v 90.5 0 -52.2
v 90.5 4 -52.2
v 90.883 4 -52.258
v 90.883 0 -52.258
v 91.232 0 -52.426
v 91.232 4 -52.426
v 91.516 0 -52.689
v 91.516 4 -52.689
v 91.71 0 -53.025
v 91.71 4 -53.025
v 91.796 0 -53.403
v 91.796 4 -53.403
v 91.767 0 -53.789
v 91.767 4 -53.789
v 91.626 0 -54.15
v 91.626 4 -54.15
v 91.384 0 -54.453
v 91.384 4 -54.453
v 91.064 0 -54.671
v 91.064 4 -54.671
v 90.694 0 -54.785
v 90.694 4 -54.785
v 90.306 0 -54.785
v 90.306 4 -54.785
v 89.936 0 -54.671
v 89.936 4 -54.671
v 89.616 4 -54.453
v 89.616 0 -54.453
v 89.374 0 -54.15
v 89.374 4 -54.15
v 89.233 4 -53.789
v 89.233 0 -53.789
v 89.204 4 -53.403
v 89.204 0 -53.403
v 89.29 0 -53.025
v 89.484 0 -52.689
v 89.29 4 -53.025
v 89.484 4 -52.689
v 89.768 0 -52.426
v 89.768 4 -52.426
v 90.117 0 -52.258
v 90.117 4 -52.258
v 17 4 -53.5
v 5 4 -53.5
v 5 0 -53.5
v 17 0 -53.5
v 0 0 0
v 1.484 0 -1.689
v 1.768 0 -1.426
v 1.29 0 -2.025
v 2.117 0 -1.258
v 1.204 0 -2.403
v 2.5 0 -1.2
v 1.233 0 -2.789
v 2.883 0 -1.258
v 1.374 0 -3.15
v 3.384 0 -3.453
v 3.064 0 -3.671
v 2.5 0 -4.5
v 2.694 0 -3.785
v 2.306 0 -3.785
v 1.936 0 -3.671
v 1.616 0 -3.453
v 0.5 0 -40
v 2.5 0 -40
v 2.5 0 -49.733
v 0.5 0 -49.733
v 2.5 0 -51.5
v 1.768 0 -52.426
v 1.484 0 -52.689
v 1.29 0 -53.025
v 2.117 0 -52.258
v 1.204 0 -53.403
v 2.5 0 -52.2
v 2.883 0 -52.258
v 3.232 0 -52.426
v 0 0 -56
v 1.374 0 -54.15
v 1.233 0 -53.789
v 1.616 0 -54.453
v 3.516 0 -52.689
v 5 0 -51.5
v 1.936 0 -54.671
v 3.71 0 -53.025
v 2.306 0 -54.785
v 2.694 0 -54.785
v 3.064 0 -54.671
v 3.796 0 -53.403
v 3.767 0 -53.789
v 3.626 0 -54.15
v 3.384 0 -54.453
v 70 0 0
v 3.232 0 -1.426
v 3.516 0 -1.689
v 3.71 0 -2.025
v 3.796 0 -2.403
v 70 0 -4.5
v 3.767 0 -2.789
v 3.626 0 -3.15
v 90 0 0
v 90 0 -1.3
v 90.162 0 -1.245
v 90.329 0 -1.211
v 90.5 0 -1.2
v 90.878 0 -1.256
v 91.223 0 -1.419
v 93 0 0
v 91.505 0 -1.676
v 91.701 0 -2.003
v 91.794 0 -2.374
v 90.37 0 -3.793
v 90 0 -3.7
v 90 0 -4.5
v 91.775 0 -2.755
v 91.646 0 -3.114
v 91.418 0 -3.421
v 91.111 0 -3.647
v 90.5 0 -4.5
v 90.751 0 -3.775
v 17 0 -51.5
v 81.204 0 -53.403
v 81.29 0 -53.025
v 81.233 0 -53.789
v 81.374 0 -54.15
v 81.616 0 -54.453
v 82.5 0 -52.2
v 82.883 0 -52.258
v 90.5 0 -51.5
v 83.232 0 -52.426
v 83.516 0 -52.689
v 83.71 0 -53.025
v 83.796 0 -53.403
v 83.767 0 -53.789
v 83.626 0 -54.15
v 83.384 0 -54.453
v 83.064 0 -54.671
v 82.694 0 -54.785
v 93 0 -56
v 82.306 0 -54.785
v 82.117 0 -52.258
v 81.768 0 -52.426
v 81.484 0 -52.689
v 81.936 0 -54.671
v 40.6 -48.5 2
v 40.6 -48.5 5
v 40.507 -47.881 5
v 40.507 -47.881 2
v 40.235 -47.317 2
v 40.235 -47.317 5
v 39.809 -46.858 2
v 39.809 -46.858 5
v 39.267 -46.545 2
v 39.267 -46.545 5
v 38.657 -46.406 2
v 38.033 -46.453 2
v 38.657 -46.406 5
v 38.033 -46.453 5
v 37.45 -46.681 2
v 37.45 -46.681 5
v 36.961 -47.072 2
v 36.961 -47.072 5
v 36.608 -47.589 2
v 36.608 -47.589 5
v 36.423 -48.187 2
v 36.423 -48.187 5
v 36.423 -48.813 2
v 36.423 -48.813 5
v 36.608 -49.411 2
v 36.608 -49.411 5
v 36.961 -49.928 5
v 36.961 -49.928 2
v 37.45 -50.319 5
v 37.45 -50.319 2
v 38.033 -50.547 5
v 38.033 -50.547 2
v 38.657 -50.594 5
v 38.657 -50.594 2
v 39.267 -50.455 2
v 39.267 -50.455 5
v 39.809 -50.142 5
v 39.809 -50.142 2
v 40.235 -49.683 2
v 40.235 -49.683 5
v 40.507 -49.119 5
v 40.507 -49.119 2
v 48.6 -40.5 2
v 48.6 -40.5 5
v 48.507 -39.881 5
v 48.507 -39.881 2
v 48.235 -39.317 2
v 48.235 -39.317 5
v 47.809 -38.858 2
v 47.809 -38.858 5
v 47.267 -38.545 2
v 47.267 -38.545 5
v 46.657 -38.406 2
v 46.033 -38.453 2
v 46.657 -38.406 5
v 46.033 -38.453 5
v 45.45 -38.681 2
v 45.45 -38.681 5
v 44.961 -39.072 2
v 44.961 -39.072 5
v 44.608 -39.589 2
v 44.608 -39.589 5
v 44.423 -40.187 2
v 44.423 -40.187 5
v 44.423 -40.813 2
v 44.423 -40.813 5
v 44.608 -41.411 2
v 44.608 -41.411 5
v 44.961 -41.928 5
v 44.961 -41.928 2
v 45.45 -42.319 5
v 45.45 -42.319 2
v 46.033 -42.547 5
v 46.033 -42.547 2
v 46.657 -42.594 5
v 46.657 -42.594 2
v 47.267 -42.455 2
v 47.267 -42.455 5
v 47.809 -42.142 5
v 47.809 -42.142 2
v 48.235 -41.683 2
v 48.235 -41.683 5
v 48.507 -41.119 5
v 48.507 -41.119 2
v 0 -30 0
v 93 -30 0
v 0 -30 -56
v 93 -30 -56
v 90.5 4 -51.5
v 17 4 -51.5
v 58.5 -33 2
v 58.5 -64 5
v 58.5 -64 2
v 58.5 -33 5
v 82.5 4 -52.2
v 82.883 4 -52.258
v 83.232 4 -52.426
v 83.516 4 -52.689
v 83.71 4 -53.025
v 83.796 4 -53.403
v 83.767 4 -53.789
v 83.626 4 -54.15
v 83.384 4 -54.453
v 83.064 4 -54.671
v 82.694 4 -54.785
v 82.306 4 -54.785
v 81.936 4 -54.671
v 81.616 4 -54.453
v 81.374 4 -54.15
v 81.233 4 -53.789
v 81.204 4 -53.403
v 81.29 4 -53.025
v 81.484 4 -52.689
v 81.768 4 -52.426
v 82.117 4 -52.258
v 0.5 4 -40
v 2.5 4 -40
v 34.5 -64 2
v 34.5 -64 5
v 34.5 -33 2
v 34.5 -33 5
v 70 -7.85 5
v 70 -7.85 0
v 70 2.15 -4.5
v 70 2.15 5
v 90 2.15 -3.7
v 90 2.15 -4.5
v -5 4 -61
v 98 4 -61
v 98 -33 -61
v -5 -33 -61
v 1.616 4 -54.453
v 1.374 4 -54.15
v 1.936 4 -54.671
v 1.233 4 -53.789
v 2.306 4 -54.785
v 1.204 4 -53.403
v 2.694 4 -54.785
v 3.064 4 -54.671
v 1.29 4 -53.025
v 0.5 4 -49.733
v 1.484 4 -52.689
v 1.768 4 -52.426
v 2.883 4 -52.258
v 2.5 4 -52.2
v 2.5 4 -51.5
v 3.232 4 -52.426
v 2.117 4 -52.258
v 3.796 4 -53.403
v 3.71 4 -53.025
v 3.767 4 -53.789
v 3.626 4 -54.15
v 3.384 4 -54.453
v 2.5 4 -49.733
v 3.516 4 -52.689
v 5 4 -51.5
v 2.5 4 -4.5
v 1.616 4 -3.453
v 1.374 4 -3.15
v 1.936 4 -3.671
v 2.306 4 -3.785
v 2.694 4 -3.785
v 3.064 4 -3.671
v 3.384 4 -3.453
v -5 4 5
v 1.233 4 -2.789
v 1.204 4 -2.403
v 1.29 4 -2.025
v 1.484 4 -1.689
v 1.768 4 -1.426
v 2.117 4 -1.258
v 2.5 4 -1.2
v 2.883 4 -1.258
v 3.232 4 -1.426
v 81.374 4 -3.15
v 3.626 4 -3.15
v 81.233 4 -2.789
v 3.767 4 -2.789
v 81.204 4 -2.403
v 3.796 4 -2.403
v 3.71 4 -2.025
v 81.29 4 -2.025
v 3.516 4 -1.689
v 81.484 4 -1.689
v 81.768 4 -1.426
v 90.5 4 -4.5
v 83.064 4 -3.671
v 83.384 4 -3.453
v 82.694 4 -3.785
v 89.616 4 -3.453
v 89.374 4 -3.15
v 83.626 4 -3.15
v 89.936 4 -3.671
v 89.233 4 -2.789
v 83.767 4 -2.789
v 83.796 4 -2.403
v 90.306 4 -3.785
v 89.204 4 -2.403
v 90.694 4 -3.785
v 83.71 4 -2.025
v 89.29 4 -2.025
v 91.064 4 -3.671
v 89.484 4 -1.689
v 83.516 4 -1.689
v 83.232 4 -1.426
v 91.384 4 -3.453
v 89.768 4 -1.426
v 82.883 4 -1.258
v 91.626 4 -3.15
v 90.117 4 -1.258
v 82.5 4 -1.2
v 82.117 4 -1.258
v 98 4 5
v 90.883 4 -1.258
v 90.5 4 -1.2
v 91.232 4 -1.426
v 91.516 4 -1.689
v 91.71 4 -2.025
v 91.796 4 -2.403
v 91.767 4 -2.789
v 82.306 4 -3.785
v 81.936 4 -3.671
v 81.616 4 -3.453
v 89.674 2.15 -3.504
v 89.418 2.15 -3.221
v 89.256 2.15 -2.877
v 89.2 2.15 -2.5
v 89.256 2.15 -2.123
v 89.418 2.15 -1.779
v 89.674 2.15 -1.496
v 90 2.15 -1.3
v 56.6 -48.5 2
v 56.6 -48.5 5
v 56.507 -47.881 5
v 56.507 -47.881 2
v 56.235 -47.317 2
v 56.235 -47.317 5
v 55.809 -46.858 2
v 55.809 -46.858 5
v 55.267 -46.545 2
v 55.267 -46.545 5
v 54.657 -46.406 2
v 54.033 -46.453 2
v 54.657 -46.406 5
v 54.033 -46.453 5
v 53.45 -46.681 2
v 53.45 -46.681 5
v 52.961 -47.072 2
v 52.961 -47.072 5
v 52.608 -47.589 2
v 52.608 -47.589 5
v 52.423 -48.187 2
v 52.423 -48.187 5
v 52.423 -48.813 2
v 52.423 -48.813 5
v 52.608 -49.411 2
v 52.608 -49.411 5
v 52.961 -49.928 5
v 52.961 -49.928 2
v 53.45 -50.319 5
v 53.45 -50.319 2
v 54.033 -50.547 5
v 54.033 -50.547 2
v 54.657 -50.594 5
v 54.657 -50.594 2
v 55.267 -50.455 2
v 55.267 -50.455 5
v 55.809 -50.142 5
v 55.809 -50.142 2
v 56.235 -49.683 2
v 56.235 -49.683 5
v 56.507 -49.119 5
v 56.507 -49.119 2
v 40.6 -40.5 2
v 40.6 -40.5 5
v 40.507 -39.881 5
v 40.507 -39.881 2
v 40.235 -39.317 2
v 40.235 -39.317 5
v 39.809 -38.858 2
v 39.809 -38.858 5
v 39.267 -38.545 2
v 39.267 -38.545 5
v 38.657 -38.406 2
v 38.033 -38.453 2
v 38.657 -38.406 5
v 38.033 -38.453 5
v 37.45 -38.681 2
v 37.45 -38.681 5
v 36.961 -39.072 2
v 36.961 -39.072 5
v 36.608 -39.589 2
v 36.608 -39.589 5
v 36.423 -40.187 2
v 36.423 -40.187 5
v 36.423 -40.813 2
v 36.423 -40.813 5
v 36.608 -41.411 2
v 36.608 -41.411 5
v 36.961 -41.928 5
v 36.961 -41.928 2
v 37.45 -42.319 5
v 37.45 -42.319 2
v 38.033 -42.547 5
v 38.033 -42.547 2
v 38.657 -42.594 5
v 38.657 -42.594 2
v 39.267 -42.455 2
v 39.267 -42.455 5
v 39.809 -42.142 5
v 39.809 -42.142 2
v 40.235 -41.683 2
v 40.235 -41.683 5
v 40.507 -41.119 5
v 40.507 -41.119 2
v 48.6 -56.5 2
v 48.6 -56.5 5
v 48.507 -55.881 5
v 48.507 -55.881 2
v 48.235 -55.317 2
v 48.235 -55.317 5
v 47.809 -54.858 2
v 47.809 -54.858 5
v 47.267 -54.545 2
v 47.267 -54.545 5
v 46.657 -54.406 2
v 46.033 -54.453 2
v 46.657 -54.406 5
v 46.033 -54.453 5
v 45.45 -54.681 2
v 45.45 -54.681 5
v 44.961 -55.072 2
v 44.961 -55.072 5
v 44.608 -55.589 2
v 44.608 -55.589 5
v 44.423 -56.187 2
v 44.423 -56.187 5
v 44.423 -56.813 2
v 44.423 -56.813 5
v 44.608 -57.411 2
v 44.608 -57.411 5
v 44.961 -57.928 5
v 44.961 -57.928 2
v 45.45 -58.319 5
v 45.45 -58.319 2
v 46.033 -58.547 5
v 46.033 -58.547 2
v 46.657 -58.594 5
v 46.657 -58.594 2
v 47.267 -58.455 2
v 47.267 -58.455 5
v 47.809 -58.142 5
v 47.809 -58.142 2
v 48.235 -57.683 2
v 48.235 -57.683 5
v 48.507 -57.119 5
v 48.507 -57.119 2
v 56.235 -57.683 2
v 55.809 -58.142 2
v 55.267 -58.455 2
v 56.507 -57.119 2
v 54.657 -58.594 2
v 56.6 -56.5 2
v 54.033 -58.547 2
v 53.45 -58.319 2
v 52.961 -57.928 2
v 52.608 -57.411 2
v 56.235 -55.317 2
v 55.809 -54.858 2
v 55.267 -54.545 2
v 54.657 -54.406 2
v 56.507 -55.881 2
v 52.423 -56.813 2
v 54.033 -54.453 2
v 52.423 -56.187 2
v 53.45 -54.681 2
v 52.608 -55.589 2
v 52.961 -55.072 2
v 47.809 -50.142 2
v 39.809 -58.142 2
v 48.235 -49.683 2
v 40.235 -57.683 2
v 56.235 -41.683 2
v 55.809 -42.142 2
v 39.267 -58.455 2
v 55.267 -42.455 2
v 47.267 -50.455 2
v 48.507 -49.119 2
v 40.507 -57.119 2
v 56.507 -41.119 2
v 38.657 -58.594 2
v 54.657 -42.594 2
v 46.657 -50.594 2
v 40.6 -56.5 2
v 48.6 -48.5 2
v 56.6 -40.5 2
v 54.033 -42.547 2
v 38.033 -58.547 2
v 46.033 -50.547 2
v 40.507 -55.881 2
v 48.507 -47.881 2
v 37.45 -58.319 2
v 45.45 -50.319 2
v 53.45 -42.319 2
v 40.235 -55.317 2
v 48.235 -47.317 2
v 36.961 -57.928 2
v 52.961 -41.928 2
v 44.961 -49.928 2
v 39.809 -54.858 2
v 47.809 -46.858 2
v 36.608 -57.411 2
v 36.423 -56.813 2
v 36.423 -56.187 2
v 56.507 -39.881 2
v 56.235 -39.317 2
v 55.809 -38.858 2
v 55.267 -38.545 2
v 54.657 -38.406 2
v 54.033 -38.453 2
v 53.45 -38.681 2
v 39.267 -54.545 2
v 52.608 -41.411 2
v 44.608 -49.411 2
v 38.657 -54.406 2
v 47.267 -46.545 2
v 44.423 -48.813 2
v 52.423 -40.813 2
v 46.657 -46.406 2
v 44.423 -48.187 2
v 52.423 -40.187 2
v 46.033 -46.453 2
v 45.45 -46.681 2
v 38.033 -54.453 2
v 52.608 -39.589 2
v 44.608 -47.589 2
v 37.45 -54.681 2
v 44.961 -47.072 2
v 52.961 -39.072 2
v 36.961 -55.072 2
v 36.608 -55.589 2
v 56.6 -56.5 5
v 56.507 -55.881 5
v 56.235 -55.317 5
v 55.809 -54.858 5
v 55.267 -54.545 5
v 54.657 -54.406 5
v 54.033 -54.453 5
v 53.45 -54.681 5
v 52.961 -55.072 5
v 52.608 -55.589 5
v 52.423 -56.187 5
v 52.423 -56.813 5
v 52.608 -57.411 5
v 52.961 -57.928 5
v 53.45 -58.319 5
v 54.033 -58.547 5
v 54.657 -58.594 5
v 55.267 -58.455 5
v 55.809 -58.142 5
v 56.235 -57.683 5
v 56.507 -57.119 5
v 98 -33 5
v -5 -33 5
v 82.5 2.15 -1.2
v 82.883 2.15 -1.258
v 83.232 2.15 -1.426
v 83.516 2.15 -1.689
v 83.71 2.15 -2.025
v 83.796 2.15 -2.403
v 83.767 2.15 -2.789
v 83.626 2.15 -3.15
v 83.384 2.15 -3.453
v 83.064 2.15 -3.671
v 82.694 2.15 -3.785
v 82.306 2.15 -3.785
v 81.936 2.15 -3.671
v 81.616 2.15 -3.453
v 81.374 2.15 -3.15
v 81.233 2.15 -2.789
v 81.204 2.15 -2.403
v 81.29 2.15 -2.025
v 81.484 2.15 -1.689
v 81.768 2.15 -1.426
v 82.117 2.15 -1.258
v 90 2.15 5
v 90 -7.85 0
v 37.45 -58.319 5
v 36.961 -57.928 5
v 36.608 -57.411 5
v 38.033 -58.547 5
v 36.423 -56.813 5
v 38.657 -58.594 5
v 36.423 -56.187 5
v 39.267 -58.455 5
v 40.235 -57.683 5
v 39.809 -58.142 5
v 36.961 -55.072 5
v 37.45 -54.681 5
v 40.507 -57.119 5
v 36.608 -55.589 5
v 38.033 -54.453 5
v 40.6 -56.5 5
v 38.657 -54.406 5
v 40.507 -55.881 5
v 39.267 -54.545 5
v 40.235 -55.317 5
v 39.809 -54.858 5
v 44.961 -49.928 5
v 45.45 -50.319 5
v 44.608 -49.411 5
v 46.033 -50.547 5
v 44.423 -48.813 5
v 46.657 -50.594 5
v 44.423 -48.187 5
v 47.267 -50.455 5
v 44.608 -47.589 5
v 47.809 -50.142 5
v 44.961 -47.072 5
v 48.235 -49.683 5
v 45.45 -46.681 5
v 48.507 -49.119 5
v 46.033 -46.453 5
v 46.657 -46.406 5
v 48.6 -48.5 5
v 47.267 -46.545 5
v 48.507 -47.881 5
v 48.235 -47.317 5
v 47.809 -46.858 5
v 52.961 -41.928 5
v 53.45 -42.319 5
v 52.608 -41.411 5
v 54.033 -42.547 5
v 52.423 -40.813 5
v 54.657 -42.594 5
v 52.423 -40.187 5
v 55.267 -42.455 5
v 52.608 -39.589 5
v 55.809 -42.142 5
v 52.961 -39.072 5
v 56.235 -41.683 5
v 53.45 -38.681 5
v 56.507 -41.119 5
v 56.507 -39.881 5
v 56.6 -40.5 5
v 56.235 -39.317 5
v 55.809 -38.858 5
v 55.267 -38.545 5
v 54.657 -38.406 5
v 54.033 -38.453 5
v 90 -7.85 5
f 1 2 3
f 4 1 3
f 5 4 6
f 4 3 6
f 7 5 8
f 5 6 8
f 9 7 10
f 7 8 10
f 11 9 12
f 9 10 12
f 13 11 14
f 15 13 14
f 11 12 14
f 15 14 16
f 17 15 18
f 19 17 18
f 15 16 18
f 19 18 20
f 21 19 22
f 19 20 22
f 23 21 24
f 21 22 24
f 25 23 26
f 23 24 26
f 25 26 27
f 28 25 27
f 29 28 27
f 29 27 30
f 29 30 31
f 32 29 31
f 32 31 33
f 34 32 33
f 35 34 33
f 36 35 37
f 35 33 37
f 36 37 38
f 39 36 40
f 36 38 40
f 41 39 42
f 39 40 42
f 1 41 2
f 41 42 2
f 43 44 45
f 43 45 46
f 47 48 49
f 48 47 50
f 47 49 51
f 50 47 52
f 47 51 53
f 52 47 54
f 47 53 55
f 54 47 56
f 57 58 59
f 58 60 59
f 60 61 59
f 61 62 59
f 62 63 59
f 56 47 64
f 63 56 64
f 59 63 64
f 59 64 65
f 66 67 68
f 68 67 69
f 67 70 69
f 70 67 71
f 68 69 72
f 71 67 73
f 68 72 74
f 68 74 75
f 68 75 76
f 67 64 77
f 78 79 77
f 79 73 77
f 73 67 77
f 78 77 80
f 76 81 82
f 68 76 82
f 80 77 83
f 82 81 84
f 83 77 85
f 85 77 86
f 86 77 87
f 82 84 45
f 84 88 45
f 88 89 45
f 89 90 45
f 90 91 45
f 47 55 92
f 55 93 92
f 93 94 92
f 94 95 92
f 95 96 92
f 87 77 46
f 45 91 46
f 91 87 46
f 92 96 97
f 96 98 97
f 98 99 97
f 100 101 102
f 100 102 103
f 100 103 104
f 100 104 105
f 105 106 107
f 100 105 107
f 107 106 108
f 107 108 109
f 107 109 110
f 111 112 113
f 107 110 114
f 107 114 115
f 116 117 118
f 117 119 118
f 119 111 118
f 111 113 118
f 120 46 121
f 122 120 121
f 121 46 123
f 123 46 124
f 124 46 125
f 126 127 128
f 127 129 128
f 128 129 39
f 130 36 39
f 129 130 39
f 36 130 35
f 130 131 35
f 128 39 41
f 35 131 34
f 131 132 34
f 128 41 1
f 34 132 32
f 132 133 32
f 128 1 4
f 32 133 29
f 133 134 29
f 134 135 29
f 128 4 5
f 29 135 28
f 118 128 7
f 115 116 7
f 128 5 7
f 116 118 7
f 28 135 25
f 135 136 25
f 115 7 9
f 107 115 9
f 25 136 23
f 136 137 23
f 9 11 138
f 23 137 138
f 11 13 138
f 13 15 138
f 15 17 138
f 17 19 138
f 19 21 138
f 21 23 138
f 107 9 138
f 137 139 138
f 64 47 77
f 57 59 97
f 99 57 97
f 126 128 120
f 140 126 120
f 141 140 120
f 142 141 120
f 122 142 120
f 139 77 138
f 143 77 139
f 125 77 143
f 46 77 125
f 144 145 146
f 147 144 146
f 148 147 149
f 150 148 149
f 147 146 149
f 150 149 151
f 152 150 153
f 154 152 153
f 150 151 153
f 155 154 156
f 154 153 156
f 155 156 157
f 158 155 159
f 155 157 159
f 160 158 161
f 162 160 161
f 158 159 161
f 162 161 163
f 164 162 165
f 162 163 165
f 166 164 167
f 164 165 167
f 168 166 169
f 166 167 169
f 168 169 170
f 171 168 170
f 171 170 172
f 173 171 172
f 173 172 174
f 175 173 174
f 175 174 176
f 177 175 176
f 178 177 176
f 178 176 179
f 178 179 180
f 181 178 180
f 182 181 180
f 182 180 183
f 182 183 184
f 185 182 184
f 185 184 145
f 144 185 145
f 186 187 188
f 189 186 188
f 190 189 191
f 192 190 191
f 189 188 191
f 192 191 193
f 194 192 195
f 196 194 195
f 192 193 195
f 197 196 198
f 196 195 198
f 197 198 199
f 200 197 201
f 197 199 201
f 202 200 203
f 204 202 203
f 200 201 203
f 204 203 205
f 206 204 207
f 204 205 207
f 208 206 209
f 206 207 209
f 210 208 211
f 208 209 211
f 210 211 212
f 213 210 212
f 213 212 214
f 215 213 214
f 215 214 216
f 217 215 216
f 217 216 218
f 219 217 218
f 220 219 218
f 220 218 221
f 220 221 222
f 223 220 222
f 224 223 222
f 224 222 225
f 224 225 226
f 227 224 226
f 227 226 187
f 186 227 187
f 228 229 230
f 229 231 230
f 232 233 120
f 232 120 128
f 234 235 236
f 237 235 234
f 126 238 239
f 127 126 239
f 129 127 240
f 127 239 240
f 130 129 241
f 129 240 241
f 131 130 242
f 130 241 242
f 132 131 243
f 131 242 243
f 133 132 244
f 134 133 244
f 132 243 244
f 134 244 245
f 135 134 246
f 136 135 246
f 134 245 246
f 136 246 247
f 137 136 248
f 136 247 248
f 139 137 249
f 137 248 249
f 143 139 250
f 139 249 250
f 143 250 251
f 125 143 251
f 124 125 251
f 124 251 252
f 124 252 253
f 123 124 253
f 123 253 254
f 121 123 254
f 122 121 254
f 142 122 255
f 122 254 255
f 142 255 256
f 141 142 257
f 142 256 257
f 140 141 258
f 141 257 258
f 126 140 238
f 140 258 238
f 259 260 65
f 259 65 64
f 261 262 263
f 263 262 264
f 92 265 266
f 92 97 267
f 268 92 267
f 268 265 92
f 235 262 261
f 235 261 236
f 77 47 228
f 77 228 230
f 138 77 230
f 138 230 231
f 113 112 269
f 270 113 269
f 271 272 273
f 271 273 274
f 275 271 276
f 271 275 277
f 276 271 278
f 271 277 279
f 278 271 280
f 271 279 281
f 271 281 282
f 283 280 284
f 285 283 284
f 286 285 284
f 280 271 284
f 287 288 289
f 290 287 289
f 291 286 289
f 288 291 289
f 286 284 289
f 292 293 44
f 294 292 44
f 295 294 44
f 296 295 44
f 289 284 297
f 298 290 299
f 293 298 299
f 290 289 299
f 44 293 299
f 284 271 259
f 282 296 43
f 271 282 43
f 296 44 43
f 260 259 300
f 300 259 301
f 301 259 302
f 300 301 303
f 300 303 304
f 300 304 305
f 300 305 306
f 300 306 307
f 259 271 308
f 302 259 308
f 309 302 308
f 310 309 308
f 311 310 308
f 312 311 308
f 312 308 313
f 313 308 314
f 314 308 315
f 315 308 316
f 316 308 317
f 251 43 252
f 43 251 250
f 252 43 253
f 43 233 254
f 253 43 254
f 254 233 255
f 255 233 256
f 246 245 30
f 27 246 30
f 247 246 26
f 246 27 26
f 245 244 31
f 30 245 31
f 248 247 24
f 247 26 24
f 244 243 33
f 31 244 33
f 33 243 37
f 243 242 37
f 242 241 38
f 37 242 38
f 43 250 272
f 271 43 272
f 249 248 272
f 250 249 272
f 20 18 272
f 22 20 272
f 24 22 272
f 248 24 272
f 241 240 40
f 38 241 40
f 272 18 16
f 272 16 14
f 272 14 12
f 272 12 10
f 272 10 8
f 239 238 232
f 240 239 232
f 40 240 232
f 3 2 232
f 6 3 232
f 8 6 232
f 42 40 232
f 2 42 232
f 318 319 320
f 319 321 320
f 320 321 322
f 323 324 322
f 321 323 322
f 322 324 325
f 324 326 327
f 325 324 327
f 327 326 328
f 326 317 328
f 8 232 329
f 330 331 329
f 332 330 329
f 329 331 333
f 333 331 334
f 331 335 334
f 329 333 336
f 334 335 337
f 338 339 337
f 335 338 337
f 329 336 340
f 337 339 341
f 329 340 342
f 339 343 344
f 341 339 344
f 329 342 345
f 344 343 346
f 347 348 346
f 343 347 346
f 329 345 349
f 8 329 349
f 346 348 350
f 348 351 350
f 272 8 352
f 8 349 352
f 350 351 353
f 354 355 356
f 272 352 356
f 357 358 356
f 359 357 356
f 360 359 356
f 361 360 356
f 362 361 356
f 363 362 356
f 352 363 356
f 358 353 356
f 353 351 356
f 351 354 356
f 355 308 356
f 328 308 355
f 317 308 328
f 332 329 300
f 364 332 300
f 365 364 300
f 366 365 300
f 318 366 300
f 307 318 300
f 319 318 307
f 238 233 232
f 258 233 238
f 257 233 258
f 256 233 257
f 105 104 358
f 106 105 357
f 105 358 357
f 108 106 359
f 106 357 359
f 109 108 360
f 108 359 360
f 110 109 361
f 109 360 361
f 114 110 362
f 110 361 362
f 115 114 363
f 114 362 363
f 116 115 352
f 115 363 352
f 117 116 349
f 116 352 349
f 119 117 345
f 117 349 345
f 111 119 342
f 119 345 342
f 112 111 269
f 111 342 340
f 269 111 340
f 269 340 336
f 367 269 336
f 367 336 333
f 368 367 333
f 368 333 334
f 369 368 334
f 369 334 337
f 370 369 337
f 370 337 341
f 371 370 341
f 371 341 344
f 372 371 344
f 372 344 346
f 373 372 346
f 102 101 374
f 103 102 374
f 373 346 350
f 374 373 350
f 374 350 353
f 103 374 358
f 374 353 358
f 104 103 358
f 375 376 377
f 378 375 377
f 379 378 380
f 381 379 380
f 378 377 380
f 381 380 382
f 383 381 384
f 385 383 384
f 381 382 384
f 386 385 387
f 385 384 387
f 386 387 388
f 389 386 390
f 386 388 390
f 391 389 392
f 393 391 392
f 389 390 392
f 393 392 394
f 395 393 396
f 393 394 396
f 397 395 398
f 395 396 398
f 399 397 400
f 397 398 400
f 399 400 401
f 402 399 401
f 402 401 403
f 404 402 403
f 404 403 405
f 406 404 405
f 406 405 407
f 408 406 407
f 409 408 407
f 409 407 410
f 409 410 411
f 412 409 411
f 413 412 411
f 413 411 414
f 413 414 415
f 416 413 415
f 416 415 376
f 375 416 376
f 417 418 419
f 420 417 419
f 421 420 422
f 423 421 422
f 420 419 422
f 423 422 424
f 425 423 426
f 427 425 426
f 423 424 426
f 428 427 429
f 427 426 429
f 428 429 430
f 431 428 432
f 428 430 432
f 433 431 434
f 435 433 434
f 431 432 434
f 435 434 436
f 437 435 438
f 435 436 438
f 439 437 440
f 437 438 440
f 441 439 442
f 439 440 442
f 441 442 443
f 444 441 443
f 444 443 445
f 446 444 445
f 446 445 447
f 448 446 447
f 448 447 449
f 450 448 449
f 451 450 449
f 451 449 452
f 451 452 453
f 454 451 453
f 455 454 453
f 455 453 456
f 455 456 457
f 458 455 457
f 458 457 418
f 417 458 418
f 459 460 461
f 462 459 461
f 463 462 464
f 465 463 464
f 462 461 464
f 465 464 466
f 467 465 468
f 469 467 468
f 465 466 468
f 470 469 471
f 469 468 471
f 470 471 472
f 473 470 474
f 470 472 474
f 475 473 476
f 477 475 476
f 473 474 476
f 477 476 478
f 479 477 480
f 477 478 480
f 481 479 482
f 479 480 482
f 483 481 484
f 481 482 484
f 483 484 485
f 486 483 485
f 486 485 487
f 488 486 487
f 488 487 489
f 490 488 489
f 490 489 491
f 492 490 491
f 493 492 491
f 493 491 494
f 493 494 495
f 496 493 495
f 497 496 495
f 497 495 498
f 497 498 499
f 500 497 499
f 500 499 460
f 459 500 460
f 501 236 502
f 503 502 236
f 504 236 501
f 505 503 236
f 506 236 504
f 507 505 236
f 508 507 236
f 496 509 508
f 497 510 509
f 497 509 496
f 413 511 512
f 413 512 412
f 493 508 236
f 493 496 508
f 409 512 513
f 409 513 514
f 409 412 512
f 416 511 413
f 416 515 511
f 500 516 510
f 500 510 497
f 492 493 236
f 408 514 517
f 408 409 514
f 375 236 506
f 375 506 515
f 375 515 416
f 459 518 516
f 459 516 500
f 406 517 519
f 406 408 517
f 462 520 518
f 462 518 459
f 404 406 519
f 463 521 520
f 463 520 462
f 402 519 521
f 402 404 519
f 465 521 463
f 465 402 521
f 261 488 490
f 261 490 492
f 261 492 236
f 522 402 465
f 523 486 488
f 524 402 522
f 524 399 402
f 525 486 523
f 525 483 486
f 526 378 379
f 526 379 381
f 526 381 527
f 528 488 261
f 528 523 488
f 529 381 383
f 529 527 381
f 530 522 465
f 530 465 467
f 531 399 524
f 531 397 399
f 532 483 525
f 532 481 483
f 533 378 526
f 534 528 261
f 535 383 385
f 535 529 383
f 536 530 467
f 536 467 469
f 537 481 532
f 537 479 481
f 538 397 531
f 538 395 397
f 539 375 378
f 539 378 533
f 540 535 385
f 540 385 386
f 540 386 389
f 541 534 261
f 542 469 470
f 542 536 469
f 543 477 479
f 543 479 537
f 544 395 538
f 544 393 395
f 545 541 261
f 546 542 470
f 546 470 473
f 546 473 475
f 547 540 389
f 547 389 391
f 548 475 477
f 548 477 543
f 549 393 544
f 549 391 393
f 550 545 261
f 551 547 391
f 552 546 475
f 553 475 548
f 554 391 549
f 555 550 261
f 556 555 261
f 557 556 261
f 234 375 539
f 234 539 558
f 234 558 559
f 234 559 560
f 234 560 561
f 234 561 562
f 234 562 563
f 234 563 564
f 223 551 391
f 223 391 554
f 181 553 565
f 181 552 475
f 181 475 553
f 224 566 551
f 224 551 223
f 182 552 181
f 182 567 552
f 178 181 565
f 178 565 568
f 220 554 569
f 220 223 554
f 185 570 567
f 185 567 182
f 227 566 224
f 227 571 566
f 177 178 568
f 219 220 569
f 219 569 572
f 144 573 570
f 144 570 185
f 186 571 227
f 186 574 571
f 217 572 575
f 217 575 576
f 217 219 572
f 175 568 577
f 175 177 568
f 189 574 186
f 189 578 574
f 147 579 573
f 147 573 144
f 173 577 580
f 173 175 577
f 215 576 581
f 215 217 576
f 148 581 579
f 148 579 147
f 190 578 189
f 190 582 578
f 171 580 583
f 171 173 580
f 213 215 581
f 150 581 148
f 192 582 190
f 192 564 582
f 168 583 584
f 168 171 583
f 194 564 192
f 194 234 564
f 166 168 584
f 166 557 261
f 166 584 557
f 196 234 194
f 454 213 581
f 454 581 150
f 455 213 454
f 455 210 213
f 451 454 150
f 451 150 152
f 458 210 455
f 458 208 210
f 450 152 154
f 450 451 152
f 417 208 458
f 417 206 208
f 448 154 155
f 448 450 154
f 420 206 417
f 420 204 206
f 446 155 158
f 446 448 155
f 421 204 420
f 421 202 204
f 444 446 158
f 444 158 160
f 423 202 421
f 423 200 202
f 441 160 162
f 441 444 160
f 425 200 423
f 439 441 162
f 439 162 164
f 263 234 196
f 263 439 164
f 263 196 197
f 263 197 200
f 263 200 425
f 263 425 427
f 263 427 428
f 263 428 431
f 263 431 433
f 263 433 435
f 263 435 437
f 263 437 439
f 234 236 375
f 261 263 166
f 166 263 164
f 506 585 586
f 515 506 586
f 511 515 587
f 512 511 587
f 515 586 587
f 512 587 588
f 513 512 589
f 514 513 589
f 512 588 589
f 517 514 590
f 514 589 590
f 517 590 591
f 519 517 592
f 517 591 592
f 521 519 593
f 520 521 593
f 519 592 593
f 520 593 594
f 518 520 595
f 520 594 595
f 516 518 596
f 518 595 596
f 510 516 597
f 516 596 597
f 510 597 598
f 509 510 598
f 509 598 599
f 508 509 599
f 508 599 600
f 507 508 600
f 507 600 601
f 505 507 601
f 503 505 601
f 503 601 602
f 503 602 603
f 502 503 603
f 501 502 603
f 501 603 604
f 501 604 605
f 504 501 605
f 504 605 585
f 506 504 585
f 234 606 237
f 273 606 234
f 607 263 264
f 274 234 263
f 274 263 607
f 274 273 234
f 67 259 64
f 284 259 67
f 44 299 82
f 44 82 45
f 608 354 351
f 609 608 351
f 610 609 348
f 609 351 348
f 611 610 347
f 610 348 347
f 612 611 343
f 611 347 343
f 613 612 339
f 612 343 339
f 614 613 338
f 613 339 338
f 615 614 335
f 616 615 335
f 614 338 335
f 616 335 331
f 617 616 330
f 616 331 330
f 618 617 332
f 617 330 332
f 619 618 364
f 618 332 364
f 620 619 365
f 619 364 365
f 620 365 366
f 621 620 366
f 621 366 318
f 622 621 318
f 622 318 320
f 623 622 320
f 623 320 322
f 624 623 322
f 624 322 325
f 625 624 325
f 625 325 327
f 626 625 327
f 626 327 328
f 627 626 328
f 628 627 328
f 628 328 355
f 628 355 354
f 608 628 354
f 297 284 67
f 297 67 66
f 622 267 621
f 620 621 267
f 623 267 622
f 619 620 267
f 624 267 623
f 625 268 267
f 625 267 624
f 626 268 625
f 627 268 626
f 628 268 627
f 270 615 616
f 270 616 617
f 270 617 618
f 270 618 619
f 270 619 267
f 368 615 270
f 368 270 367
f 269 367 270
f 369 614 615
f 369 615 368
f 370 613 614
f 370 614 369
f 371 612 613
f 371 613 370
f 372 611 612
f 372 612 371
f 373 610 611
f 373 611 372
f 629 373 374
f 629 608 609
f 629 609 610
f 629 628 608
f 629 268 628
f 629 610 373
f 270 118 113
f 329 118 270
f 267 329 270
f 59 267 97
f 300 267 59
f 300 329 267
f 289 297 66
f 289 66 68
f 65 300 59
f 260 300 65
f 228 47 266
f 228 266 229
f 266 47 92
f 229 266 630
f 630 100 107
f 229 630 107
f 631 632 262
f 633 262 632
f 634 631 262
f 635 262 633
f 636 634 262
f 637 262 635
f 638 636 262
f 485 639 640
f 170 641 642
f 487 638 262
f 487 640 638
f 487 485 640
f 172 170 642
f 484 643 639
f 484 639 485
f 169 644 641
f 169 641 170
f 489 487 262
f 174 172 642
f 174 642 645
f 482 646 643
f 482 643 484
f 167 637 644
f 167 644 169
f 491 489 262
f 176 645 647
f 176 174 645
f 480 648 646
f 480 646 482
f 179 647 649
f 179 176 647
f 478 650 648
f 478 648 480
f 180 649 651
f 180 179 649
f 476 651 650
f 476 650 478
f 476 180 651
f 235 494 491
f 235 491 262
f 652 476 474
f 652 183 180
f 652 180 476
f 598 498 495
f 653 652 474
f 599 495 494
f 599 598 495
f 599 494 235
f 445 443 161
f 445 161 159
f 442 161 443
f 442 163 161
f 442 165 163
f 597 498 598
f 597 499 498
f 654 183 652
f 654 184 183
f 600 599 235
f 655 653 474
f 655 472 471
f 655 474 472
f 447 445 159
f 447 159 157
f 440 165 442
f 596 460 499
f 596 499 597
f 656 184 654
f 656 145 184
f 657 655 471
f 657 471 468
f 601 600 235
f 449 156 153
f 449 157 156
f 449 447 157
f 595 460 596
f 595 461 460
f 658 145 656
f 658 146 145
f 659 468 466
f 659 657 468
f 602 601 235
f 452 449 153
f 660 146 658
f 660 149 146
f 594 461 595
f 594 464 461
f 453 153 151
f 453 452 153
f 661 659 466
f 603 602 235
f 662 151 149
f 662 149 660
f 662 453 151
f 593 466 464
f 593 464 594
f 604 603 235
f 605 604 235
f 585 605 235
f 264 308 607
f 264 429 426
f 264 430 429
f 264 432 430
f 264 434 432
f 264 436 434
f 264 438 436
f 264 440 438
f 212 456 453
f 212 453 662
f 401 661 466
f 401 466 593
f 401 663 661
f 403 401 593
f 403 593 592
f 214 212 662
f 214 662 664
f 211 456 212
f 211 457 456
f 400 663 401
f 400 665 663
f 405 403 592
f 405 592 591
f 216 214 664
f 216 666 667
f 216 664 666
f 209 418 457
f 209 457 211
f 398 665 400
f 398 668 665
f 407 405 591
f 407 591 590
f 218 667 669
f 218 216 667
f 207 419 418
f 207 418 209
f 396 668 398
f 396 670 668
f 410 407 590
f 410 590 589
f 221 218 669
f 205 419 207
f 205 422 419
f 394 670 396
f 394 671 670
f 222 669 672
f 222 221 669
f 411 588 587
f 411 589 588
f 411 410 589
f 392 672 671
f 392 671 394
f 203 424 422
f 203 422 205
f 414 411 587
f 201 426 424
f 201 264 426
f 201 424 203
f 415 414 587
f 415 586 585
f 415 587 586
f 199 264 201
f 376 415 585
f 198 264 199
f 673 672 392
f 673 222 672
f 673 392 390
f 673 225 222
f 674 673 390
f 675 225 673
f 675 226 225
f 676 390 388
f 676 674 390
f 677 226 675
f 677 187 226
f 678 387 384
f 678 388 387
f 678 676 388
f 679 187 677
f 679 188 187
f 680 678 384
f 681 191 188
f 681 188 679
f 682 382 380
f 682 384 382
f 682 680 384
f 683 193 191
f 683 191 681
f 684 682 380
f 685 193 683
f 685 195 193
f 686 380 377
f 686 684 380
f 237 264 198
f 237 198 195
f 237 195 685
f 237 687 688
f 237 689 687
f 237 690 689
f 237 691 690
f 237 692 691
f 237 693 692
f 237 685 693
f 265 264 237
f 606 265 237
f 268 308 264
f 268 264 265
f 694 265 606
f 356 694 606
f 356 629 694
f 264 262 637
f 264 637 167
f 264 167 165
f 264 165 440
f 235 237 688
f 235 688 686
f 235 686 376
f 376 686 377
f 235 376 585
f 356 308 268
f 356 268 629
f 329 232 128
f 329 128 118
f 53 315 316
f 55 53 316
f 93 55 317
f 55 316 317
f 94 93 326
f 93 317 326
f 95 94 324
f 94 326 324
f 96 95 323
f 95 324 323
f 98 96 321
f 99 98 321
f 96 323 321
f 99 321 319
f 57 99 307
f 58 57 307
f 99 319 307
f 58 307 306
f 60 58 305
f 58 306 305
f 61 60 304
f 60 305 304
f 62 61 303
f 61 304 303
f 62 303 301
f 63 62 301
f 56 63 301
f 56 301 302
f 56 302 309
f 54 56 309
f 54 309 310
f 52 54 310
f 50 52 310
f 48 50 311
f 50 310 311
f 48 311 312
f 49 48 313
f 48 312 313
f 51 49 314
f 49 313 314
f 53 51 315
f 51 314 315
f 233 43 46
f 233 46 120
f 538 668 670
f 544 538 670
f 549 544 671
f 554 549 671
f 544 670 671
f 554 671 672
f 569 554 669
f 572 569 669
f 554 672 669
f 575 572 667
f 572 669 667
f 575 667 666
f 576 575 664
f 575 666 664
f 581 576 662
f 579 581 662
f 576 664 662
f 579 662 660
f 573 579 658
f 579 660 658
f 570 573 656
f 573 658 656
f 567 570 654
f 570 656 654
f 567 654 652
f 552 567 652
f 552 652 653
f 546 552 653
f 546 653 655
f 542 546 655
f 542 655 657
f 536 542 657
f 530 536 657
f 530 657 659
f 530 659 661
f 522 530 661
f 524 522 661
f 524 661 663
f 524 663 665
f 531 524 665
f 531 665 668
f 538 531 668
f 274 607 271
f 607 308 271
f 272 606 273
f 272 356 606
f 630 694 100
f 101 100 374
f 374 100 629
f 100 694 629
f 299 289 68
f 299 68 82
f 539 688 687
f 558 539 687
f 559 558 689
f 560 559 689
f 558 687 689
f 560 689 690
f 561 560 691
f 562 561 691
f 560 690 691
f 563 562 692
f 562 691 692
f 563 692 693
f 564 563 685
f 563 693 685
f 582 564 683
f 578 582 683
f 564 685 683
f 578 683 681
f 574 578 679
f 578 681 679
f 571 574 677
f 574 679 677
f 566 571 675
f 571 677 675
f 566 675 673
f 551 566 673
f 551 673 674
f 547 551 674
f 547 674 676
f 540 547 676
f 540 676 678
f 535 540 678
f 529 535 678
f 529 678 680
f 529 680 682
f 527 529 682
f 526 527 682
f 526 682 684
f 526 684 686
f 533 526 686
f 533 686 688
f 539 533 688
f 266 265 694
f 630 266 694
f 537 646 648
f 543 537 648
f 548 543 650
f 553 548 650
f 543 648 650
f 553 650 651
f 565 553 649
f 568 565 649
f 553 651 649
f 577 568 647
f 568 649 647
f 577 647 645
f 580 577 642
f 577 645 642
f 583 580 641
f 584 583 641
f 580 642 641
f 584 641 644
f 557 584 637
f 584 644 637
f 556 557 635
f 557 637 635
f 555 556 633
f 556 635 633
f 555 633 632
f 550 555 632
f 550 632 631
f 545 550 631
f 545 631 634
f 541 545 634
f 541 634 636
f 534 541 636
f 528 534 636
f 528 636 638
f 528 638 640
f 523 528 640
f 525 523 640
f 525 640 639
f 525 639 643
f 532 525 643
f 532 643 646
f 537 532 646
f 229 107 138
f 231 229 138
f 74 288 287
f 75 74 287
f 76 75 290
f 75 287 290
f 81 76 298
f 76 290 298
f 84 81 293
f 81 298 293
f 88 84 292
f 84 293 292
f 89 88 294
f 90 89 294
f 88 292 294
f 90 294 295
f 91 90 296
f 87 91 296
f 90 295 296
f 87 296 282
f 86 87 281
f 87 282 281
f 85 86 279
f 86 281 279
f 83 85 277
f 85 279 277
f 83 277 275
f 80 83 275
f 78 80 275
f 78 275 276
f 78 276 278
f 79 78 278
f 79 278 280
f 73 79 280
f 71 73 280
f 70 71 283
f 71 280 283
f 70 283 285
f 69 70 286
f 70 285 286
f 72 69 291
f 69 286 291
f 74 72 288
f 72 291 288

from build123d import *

# Parameters (mm, degrees)
SKETCH_1_W          = 93
SKETCH_1_H          = 56
EXTRUDE_1_DEPTH     = 4
SKETCH_2_R          = 1.3
CUT_EXTRUDE_1_DEPTH = 4
SKETCH_3_W          = 5
SKETCH_3_H          = 56
EXTRUDE_2_DEPTH     = 34
SKETCH_4_W          = 103
SKETCH_4_H          = 66
EXTRUDE_3_DEPTH     = 3
CUT_EXTRUDE_2_DEPTH = 21
SKETCH_6_W          = 24
SKETCH_6_H          = 68
EXTRUDE_4_DEPTH     = 5
SKETCH_7_R          = 2.1
CUT_EXTRUDE_3_DEPTH = 5
SKETCH_9_W          = 24
SKETCH_9_H          = 31
SKETCH_9_R          = 1.8
CUT_EXTRUDE_5_DEPTH = 2
SKETCH_10_W         = 20
SKETCH_10_H         = 10
CUT_EXTRUDE_6_DEPTH = 10


with BuildPart() as part:
    # 草圖1 → 填料-伸長1 (new body)
    with BuildSketch(Plane(origin=(0, 0, 0), x_dir=(1, 0, 0), z_dir=(0, 1, 0))):
        with Locations((46.5, 28)):
            Rectangle(SKETCH_1_W, SKETCH_1_H)
    extrude(amount=EXTRUDE_1_DEPTH)

    # 草圖2 → 除料-伸長1 (cut)
    with BuildSketch(Plane(origin=(0, 4, 0), x_dir=(1, 0, 0), z_dir=(0, 1, 0))):
        with Locations(Location((90.5, 53.5, 0), (0, 0, 270))):
            Circle(SKETCH_2_R)
        with Locations(Location((90.5, 2.5, 0), (0, 0, 270))):
            Circle(SKETCH_2_R)
        with Locations(Location((2.5, 53.5, 0), (0, 0, 270))):
            Circle(SKETCH_2_R)
        with Locations(Location((2.5, 2.5, 0), (0, 0, 270))):
            Circle(SKETCH_2_R)
        with Locations(Location((82.5, 2.5, 0), (0, 0, 270))):
            Circle(SKETCH_2_R)
        with Locations(Location((82.5, 53.5, 0), (0, 0, 270))):
            Circle(SKETCH_2_R)
    extrude(amount=-CUT_EXTRUDE_1_DEPTH, mode=Mode.SUBTRACT)

    # 草圖3 → 填料-伸長2 (add)
    with BuildSketch(Plane(origin=(0, 4, 0), x_dir=(1, 0, 0), z_dir=(0, 1, 0))):
        with Locations((-2.5, 28)):
            Rectangle(SKETCH_3_W, SKETCH_3_H)
        Polygon((93, 56), (98, 56), (98, 61), (-5, 61), (-5, 56), (0, 56), align=None)
        with Locations((95.5, 28)):
            Rectangle(SKETCH_3_W, SKETCH_3_H)
        Polygon((98, 0), (98, -5), (-5, -5), (-5, 0), (0, 0), (93, 0), align=None)
    extrude(amount=-EXTRUDE_2_DEPTH)

    # 草圖4 → 填料-伸長3 (add)
    with BuildSketch(Plane(origin=(0, -30, 0), x_dir=(-1, 0, 0), z_dir=(0, -1, 0))):
        with Locations((-46.5, 28)):
            Rectangle(SKETCH_4_W, SKETCH_4_H)
    extrude(amount=EXTRUDE_3_DEPTH)

    # 草圖5 → 除料-伸長2 (cut)
    with BuildSketch(Plane(origin=(0, 4, 0), x_dir=(1, 0, 0), z_dir=(0, 1, 0))):
        Polygon((2.5, 51.5), (5, 51.5), (5, 53.5), (17, 53.5), (17, 51.5), (90.5, 51.5), (90.5, 4.5), (2.5, 4.5), (2.5, 40), (0.5, 40), (0.5, 49.733475986), (2.5, 49.733475986), align=None)
    extrude(amount=-CUT_EXTRUDE_2_DEPTH, mode=Mode.SUBTRACT)

    # 草圖6 → 填料-伸長4 (add)
    with BuildSketch(Plane.XY.offset(5)):
        with Locations((46.5, -30)):
            Rectangle(SKETCH_6_W, SKETCH_6_H)
    extrude(amount=-EXTRUDE_4_DEPTH)

    # 草圖7 → 除料-伸長3 (cut)
    with BuildSketch(Plane.XY.offset(5)):
        with Locations((38.5, -40.5)):
            Circle(SKETCH_7_R)
        with Locations((38.5, -48.5)):
            Circle(SKETCH_7_R)
        with Locations((38.5, -56.5)):
            Circle(SKETCH_7_R)
        with Locations((46.5, -40.5)):
            Circle(SKETCH_7_R)
        with Locations((46.5, -48.5)):
            Circle(SKETCH_7_R)
        with Locations((46.5, -56.5)):
            Circle(SKETCH_7_R)
        with Locations((54.5, -40.5)):
            Circle(SKETCH_7_R)
        with Locations((54.5, -48.5)):
            Circle(SKETCH_7_R)
        with Locations((54.5, -56.5)):
            Circle(SKETCH_7_R)
    extrude(amount=-CUT_EXTRUDE_3_DEPTH, mode=Mode.SUBTRACT)

    # 草圖9 → 除料-伸長5 (cut)
    with BuildSketch(Plane(origin=(0, 0, 0), x_dir=(-1, 0, 0), z_dir=(0, 0, -1))):
        with Locations((-46.5, -48.5)):
            Rectangle(SKETCH_9_W, SKETCH_9_H)
        with Locations((-54.5, -40.5)):
            Circle(SKETCH_9_R, mode=Mode.SUBTRACT)
        with Locations((-46.5, -40.5)):
            Circle(SKETCH_9_R, mode=Mode.SUBTRACT)
        with Locations((-38.5, -40.5)):
            Circle(SKETCH_9_R, mode=Mode.SUBTRACT)
        with Locations((-38.5, -48.5)):
            Circle(SKETCH_9_R, mode=Mode.SUBTRACT)
        with Locations((-46.5, -48.5)):
            Circle(SKETCH_9_R, mode=Mode.SUBTRACT)
        with Locations((-54.5, -48.5)):
            Circle(SKETCH_9_R, mode=Mode.SUBTRACT)
        with Locations((-54.5, -56.5)):
            Circle(SKETCH_9_R, mode=Mode.SUBTRACT)
        with Locations((-46.5, -56.5)):
            Circle(SKETCH_9_R, mode=Mode.SUBTRACT)
        with Locations((-38.5, -56.5)):
            Circle(SKETCH_9_R, mode=Mode.SUBTRACT)
    extrude(amount=-CUT_EXTRUDE_5_DEPTH, mode=Mode.SUBTRACT)

    # 草圖10 → 除料-伸長6 (cut)
    with BuildSketch(Plane.XY.offset(5)):
        with Locations((80, -2.85)):
            Rectangle(SKETCH_10_W, SKETCH_10_H)
    extrude(amount=-CUT_EXTRUDE_6_DEPTH, mode=Mode.SUBTRACT)


solid = part.part
